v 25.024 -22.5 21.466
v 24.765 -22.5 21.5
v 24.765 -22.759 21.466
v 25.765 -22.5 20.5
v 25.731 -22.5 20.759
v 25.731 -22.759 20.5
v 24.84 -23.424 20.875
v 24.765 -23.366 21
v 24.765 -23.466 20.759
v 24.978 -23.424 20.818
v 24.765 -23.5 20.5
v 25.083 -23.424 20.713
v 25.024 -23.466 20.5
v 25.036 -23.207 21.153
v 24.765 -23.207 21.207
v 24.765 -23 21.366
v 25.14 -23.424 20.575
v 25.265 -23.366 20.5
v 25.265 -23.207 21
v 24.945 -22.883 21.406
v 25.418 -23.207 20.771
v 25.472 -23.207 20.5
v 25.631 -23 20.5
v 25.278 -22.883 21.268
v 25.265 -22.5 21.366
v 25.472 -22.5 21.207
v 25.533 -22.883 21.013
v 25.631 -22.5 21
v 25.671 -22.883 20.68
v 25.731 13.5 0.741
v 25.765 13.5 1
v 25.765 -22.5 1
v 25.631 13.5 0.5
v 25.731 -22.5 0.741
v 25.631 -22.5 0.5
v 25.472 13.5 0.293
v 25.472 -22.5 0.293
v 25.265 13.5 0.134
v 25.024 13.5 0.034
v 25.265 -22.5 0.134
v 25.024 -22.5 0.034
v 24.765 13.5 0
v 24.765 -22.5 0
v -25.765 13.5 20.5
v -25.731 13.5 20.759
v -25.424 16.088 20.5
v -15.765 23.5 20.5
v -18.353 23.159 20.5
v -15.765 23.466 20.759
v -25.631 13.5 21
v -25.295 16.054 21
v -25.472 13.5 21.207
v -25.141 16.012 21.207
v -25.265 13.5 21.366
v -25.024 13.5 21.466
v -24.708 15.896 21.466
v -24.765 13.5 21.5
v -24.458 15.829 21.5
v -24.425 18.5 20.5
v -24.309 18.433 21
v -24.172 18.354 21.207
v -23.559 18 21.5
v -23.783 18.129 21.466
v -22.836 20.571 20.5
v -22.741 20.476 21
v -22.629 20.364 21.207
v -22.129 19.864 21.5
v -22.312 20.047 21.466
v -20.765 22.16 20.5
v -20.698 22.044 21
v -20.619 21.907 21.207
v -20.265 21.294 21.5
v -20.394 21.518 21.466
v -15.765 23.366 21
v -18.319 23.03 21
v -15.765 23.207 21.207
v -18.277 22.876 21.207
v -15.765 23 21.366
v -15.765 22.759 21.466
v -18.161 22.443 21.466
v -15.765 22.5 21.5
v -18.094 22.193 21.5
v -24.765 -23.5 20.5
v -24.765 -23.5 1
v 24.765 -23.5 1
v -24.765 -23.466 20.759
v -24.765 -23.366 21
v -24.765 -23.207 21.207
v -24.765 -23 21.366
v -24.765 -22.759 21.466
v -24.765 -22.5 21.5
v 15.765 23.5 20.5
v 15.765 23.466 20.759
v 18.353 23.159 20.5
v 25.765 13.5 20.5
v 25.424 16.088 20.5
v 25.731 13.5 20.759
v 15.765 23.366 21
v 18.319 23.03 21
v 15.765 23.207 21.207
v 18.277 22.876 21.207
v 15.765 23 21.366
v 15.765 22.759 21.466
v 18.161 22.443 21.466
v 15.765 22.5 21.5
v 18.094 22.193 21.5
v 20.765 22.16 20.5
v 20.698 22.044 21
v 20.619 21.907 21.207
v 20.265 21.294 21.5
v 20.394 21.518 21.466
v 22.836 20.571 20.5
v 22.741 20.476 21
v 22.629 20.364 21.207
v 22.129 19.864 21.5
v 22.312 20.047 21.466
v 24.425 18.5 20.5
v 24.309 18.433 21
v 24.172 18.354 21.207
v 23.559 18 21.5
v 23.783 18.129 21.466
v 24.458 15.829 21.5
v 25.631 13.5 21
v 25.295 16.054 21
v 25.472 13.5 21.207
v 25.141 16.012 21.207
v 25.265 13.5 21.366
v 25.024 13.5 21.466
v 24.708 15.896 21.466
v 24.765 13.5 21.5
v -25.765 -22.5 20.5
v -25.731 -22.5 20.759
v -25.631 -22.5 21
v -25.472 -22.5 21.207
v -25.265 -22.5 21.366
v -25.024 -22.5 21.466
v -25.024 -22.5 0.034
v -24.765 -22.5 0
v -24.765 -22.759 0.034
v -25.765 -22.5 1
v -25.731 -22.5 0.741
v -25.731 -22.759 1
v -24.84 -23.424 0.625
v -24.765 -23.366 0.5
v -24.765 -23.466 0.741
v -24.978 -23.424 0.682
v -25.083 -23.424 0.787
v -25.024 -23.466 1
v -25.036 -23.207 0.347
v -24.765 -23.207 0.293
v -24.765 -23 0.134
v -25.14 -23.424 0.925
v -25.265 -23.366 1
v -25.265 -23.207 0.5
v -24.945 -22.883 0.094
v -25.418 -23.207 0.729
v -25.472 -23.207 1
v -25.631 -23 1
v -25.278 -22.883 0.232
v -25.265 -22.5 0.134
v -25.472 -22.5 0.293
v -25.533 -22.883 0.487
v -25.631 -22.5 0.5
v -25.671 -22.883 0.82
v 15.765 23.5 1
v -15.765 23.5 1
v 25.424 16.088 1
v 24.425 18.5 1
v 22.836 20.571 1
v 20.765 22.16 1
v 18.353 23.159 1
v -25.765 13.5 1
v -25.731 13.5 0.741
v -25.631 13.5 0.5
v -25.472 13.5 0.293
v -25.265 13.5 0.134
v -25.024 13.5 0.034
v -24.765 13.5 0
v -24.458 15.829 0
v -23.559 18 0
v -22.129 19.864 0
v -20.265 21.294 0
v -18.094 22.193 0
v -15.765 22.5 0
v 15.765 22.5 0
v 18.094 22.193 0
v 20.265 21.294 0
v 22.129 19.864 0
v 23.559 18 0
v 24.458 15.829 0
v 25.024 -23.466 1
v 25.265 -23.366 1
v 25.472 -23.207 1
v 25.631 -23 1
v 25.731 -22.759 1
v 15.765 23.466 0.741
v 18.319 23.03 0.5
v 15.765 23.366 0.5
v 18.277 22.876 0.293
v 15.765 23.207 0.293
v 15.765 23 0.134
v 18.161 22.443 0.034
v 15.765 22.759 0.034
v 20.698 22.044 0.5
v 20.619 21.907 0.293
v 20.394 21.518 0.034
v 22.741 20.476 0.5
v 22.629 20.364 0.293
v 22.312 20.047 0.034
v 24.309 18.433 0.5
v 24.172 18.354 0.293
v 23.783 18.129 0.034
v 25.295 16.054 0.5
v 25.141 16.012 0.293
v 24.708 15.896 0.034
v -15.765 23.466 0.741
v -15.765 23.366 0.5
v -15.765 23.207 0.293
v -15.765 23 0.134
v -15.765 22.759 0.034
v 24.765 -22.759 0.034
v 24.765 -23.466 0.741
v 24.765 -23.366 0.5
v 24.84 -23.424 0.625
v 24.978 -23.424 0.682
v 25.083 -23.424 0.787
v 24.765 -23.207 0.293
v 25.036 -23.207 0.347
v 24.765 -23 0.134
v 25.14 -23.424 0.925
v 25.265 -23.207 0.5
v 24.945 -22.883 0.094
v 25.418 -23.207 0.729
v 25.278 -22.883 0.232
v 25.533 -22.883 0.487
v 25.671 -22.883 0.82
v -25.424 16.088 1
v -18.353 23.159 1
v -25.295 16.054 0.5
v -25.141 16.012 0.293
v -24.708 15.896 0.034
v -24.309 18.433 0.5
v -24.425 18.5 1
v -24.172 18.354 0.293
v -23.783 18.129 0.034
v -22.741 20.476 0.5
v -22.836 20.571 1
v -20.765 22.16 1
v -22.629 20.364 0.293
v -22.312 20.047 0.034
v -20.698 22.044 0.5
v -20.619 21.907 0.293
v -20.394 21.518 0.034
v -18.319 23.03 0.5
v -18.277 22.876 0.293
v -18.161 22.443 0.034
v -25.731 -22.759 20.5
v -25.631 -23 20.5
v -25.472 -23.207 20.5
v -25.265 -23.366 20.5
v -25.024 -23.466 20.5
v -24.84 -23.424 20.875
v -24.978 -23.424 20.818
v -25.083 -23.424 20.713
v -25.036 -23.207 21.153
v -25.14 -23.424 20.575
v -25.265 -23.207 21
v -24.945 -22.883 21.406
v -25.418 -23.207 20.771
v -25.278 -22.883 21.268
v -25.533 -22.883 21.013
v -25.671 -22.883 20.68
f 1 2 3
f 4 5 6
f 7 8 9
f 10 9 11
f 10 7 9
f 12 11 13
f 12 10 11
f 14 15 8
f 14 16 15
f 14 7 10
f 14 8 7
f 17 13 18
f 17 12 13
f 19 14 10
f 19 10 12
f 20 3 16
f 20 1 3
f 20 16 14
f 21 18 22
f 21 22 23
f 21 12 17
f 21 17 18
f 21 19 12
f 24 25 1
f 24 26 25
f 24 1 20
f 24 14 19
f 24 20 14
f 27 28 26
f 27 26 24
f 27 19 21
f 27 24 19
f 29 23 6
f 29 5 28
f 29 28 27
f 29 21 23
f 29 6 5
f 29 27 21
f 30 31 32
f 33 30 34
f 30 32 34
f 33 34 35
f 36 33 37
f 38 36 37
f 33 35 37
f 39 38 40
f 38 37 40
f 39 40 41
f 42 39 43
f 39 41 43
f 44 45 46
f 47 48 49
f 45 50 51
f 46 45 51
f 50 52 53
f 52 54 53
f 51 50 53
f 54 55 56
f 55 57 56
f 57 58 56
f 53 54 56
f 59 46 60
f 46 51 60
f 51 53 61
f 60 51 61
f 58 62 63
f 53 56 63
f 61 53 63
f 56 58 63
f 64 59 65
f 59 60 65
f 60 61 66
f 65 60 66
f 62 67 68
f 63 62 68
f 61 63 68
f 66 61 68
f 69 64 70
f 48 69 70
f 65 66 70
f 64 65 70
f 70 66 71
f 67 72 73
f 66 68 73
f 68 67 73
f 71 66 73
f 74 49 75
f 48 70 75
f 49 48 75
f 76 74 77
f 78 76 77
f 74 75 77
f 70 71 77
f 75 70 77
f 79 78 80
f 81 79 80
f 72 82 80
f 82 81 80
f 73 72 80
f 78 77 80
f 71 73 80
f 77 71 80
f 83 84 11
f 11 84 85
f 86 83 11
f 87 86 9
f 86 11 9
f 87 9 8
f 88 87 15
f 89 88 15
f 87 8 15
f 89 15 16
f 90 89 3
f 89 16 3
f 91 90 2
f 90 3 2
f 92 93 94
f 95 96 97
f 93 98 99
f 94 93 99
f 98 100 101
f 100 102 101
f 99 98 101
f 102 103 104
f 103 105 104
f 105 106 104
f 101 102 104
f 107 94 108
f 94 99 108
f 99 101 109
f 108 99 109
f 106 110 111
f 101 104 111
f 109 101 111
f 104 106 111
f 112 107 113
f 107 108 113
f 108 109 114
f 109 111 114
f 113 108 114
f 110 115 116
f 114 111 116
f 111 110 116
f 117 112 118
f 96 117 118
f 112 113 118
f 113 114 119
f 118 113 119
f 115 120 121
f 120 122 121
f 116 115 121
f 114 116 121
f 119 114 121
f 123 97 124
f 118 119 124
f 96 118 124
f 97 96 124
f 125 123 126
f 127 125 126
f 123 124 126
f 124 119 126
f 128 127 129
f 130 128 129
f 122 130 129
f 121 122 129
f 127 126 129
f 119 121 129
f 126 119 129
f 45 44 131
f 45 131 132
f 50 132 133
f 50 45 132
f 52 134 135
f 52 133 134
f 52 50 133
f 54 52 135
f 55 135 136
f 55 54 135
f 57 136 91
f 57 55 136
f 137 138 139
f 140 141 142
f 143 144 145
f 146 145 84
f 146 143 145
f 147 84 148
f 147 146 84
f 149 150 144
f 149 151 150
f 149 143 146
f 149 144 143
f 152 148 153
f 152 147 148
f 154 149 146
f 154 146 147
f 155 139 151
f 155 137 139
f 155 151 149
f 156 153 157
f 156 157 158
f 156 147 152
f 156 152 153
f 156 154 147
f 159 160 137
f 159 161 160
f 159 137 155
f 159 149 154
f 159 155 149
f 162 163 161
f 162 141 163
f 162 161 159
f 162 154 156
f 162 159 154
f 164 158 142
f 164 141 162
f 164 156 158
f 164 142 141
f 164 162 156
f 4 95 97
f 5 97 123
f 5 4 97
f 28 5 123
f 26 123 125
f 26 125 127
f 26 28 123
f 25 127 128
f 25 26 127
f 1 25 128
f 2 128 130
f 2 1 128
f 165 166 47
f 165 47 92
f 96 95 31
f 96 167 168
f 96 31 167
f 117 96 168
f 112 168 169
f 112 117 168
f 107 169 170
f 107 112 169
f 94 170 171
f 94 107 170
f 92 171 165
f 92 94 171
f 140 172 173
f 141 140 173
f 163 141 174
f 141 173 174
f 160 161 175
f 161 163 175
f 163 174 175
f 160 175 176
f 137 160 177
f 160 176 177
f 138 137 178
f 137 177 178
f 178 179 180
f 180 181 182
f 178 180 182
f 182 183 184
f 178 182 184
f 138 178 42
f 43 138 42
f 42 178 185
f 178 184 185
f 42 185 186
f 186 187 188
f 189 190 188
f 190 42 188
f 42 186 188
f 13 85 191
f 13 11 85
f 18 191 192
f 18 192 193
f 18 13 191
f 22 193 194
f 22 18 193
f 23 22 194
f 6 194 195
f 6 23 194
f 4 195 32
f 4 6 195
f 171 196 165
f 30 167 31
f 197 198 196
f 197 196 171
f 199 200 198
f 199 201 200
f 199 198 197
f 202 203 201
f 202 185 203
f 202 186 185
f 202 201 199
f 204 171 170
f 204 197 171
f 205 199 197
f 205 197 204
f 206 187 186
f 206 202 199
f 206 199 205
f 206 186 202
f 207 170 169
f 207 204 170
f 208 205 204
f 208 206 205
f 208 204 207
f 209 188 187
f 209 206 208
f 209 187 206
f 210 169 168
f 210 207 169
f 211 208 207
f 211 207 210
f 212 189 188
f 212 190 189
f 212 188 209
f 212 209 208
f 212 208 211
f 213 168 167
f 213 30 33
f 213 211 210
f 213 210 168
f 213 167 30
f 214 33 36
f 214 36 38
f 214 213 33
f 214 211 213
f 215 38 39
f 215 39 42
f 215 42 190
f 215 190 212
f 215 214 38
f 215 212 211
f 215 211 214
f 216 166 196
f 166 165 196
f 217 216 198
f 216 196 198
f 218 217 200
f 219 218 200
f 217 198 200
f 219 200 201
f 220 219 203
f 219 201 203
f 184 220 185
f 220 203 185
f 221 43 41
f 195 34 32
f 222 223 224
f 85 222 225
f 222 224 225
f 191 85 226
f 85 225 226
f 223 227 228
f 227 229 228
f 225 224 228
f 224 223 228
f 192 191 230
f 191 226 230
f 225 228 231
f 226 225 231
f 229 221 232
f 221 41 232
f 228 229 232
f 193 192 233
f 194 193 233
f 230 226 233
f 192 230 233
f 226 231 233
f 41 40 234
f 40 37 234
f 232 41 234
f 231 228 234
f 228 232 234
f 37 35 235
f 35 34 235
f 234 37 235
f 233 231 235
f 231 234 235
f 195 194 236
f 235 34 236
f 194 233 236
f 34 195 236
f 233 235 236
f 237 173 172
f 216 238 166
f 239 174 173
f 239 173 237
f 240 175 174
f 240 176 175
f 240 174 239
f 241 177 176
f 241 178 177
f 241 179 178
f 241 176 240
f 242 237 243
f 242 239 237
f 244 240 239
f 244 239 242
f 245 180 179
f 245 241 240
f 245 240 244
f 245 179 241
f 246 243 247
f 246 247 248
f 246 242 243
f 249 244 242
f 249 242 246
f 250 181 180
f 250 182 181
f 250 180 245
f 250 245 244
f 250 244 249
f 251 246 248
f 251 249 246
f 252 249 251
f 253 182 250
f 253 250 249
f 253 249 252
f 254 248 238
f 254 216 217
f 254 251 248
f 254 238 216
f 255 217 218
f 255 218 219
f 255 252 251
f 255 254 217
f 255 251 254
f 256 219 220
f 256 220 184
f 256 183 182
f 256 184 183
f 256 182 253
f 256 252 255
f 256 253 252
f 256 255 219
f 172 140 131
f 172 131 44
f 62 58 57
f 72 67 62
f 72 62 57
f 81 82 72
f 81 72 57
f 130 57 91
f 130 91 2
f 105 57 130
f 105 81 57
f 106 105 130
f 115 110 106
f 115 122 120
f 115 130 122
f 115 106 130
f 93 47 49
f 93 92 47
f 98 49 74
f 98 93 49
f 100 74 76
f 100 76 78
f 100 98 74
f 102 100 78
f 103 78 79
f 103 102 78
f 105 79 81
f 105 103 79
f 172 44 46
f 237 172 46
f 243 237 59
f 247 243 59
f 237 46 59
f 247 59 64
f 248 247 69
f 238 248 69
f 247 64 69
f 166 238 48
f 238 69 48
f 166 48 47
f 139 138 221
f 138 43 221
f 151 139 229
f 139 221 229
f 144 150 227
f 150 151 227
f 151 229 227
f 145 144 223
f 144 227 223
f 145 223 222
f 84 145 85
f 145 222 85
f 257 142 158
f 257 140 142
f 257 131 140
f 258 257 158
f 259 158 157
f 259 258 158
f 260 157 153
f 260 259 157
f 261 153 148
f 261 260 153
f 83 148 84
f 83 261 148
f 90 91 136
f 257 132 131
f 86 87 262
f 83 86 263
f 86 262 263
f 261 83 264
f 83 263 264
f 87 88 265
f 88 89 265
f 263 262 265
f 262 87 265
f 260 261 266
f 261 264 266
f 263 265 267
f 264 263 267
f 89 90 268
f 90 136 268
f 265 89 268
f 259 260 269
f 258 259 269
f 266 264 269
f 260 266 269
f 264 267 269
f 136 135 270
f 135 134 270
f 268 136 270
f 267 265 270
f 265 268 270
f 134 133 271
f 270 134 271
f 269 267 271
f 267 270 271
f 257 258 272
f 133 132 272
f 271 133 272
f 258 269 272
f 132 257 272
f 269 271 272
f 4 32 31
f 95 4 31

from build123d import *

# Parameters (mm, degrees)
CROQUIS1_W              = 51.53
CROQUIS1_H              = 47
SALIENTE_EXTRUIR1_DEPTH = 21.5
REDONDEO4_R             = 10
REDONDEO3_R             = 1


with BuildPart() as part:
    # Croquis1 → Saliente-Extruir1 (new body)
    with BuildSketch(Plane.XY):
        Rectangle(CROQUIS1_W, CROQUIS1_H)
    extrude(amount=SALIENTE_EXTRUIR1_DEPTH)

    # Redondeo4
    redondeo4_edges = [part.edges().sort_by_distance(p)[0] for p in [
        (-25.765, 23.5, 10.75),
        (25.765, 23.5, 10.75),
    ]]
    fillet(redondeo4_edges, radius=REDONDEO4_R)

    # Redondeo3
    redondeo3_edges = [part.edges().sort_by_distance(p)[0] for p in [
        (-25.765, -5, 0),
        (-25.765, -5, 21.5),
        (0, 23.5, 0),
        (22.836067812, 20.571067812, 0),
        (0, -23.5, 21.5),
        (-22.836067812, 20.571067812, 0),
        (0, 23.5, 21.5),
        (22.836067812, 20.571067812, 21.5),
        (-22.836067812, 20.571067812, 21.5),
        (25.765, -5, 21.5),
        (0, -23.5, 0),
        (25.765, -5, 0),
        (25.765, -23.5, 10.75),
        (-25.765, -23.5, 10.75),
    ]]
    fillet(redondeo3_edges, radius=REDONDEO3_R)


solid = part.part
